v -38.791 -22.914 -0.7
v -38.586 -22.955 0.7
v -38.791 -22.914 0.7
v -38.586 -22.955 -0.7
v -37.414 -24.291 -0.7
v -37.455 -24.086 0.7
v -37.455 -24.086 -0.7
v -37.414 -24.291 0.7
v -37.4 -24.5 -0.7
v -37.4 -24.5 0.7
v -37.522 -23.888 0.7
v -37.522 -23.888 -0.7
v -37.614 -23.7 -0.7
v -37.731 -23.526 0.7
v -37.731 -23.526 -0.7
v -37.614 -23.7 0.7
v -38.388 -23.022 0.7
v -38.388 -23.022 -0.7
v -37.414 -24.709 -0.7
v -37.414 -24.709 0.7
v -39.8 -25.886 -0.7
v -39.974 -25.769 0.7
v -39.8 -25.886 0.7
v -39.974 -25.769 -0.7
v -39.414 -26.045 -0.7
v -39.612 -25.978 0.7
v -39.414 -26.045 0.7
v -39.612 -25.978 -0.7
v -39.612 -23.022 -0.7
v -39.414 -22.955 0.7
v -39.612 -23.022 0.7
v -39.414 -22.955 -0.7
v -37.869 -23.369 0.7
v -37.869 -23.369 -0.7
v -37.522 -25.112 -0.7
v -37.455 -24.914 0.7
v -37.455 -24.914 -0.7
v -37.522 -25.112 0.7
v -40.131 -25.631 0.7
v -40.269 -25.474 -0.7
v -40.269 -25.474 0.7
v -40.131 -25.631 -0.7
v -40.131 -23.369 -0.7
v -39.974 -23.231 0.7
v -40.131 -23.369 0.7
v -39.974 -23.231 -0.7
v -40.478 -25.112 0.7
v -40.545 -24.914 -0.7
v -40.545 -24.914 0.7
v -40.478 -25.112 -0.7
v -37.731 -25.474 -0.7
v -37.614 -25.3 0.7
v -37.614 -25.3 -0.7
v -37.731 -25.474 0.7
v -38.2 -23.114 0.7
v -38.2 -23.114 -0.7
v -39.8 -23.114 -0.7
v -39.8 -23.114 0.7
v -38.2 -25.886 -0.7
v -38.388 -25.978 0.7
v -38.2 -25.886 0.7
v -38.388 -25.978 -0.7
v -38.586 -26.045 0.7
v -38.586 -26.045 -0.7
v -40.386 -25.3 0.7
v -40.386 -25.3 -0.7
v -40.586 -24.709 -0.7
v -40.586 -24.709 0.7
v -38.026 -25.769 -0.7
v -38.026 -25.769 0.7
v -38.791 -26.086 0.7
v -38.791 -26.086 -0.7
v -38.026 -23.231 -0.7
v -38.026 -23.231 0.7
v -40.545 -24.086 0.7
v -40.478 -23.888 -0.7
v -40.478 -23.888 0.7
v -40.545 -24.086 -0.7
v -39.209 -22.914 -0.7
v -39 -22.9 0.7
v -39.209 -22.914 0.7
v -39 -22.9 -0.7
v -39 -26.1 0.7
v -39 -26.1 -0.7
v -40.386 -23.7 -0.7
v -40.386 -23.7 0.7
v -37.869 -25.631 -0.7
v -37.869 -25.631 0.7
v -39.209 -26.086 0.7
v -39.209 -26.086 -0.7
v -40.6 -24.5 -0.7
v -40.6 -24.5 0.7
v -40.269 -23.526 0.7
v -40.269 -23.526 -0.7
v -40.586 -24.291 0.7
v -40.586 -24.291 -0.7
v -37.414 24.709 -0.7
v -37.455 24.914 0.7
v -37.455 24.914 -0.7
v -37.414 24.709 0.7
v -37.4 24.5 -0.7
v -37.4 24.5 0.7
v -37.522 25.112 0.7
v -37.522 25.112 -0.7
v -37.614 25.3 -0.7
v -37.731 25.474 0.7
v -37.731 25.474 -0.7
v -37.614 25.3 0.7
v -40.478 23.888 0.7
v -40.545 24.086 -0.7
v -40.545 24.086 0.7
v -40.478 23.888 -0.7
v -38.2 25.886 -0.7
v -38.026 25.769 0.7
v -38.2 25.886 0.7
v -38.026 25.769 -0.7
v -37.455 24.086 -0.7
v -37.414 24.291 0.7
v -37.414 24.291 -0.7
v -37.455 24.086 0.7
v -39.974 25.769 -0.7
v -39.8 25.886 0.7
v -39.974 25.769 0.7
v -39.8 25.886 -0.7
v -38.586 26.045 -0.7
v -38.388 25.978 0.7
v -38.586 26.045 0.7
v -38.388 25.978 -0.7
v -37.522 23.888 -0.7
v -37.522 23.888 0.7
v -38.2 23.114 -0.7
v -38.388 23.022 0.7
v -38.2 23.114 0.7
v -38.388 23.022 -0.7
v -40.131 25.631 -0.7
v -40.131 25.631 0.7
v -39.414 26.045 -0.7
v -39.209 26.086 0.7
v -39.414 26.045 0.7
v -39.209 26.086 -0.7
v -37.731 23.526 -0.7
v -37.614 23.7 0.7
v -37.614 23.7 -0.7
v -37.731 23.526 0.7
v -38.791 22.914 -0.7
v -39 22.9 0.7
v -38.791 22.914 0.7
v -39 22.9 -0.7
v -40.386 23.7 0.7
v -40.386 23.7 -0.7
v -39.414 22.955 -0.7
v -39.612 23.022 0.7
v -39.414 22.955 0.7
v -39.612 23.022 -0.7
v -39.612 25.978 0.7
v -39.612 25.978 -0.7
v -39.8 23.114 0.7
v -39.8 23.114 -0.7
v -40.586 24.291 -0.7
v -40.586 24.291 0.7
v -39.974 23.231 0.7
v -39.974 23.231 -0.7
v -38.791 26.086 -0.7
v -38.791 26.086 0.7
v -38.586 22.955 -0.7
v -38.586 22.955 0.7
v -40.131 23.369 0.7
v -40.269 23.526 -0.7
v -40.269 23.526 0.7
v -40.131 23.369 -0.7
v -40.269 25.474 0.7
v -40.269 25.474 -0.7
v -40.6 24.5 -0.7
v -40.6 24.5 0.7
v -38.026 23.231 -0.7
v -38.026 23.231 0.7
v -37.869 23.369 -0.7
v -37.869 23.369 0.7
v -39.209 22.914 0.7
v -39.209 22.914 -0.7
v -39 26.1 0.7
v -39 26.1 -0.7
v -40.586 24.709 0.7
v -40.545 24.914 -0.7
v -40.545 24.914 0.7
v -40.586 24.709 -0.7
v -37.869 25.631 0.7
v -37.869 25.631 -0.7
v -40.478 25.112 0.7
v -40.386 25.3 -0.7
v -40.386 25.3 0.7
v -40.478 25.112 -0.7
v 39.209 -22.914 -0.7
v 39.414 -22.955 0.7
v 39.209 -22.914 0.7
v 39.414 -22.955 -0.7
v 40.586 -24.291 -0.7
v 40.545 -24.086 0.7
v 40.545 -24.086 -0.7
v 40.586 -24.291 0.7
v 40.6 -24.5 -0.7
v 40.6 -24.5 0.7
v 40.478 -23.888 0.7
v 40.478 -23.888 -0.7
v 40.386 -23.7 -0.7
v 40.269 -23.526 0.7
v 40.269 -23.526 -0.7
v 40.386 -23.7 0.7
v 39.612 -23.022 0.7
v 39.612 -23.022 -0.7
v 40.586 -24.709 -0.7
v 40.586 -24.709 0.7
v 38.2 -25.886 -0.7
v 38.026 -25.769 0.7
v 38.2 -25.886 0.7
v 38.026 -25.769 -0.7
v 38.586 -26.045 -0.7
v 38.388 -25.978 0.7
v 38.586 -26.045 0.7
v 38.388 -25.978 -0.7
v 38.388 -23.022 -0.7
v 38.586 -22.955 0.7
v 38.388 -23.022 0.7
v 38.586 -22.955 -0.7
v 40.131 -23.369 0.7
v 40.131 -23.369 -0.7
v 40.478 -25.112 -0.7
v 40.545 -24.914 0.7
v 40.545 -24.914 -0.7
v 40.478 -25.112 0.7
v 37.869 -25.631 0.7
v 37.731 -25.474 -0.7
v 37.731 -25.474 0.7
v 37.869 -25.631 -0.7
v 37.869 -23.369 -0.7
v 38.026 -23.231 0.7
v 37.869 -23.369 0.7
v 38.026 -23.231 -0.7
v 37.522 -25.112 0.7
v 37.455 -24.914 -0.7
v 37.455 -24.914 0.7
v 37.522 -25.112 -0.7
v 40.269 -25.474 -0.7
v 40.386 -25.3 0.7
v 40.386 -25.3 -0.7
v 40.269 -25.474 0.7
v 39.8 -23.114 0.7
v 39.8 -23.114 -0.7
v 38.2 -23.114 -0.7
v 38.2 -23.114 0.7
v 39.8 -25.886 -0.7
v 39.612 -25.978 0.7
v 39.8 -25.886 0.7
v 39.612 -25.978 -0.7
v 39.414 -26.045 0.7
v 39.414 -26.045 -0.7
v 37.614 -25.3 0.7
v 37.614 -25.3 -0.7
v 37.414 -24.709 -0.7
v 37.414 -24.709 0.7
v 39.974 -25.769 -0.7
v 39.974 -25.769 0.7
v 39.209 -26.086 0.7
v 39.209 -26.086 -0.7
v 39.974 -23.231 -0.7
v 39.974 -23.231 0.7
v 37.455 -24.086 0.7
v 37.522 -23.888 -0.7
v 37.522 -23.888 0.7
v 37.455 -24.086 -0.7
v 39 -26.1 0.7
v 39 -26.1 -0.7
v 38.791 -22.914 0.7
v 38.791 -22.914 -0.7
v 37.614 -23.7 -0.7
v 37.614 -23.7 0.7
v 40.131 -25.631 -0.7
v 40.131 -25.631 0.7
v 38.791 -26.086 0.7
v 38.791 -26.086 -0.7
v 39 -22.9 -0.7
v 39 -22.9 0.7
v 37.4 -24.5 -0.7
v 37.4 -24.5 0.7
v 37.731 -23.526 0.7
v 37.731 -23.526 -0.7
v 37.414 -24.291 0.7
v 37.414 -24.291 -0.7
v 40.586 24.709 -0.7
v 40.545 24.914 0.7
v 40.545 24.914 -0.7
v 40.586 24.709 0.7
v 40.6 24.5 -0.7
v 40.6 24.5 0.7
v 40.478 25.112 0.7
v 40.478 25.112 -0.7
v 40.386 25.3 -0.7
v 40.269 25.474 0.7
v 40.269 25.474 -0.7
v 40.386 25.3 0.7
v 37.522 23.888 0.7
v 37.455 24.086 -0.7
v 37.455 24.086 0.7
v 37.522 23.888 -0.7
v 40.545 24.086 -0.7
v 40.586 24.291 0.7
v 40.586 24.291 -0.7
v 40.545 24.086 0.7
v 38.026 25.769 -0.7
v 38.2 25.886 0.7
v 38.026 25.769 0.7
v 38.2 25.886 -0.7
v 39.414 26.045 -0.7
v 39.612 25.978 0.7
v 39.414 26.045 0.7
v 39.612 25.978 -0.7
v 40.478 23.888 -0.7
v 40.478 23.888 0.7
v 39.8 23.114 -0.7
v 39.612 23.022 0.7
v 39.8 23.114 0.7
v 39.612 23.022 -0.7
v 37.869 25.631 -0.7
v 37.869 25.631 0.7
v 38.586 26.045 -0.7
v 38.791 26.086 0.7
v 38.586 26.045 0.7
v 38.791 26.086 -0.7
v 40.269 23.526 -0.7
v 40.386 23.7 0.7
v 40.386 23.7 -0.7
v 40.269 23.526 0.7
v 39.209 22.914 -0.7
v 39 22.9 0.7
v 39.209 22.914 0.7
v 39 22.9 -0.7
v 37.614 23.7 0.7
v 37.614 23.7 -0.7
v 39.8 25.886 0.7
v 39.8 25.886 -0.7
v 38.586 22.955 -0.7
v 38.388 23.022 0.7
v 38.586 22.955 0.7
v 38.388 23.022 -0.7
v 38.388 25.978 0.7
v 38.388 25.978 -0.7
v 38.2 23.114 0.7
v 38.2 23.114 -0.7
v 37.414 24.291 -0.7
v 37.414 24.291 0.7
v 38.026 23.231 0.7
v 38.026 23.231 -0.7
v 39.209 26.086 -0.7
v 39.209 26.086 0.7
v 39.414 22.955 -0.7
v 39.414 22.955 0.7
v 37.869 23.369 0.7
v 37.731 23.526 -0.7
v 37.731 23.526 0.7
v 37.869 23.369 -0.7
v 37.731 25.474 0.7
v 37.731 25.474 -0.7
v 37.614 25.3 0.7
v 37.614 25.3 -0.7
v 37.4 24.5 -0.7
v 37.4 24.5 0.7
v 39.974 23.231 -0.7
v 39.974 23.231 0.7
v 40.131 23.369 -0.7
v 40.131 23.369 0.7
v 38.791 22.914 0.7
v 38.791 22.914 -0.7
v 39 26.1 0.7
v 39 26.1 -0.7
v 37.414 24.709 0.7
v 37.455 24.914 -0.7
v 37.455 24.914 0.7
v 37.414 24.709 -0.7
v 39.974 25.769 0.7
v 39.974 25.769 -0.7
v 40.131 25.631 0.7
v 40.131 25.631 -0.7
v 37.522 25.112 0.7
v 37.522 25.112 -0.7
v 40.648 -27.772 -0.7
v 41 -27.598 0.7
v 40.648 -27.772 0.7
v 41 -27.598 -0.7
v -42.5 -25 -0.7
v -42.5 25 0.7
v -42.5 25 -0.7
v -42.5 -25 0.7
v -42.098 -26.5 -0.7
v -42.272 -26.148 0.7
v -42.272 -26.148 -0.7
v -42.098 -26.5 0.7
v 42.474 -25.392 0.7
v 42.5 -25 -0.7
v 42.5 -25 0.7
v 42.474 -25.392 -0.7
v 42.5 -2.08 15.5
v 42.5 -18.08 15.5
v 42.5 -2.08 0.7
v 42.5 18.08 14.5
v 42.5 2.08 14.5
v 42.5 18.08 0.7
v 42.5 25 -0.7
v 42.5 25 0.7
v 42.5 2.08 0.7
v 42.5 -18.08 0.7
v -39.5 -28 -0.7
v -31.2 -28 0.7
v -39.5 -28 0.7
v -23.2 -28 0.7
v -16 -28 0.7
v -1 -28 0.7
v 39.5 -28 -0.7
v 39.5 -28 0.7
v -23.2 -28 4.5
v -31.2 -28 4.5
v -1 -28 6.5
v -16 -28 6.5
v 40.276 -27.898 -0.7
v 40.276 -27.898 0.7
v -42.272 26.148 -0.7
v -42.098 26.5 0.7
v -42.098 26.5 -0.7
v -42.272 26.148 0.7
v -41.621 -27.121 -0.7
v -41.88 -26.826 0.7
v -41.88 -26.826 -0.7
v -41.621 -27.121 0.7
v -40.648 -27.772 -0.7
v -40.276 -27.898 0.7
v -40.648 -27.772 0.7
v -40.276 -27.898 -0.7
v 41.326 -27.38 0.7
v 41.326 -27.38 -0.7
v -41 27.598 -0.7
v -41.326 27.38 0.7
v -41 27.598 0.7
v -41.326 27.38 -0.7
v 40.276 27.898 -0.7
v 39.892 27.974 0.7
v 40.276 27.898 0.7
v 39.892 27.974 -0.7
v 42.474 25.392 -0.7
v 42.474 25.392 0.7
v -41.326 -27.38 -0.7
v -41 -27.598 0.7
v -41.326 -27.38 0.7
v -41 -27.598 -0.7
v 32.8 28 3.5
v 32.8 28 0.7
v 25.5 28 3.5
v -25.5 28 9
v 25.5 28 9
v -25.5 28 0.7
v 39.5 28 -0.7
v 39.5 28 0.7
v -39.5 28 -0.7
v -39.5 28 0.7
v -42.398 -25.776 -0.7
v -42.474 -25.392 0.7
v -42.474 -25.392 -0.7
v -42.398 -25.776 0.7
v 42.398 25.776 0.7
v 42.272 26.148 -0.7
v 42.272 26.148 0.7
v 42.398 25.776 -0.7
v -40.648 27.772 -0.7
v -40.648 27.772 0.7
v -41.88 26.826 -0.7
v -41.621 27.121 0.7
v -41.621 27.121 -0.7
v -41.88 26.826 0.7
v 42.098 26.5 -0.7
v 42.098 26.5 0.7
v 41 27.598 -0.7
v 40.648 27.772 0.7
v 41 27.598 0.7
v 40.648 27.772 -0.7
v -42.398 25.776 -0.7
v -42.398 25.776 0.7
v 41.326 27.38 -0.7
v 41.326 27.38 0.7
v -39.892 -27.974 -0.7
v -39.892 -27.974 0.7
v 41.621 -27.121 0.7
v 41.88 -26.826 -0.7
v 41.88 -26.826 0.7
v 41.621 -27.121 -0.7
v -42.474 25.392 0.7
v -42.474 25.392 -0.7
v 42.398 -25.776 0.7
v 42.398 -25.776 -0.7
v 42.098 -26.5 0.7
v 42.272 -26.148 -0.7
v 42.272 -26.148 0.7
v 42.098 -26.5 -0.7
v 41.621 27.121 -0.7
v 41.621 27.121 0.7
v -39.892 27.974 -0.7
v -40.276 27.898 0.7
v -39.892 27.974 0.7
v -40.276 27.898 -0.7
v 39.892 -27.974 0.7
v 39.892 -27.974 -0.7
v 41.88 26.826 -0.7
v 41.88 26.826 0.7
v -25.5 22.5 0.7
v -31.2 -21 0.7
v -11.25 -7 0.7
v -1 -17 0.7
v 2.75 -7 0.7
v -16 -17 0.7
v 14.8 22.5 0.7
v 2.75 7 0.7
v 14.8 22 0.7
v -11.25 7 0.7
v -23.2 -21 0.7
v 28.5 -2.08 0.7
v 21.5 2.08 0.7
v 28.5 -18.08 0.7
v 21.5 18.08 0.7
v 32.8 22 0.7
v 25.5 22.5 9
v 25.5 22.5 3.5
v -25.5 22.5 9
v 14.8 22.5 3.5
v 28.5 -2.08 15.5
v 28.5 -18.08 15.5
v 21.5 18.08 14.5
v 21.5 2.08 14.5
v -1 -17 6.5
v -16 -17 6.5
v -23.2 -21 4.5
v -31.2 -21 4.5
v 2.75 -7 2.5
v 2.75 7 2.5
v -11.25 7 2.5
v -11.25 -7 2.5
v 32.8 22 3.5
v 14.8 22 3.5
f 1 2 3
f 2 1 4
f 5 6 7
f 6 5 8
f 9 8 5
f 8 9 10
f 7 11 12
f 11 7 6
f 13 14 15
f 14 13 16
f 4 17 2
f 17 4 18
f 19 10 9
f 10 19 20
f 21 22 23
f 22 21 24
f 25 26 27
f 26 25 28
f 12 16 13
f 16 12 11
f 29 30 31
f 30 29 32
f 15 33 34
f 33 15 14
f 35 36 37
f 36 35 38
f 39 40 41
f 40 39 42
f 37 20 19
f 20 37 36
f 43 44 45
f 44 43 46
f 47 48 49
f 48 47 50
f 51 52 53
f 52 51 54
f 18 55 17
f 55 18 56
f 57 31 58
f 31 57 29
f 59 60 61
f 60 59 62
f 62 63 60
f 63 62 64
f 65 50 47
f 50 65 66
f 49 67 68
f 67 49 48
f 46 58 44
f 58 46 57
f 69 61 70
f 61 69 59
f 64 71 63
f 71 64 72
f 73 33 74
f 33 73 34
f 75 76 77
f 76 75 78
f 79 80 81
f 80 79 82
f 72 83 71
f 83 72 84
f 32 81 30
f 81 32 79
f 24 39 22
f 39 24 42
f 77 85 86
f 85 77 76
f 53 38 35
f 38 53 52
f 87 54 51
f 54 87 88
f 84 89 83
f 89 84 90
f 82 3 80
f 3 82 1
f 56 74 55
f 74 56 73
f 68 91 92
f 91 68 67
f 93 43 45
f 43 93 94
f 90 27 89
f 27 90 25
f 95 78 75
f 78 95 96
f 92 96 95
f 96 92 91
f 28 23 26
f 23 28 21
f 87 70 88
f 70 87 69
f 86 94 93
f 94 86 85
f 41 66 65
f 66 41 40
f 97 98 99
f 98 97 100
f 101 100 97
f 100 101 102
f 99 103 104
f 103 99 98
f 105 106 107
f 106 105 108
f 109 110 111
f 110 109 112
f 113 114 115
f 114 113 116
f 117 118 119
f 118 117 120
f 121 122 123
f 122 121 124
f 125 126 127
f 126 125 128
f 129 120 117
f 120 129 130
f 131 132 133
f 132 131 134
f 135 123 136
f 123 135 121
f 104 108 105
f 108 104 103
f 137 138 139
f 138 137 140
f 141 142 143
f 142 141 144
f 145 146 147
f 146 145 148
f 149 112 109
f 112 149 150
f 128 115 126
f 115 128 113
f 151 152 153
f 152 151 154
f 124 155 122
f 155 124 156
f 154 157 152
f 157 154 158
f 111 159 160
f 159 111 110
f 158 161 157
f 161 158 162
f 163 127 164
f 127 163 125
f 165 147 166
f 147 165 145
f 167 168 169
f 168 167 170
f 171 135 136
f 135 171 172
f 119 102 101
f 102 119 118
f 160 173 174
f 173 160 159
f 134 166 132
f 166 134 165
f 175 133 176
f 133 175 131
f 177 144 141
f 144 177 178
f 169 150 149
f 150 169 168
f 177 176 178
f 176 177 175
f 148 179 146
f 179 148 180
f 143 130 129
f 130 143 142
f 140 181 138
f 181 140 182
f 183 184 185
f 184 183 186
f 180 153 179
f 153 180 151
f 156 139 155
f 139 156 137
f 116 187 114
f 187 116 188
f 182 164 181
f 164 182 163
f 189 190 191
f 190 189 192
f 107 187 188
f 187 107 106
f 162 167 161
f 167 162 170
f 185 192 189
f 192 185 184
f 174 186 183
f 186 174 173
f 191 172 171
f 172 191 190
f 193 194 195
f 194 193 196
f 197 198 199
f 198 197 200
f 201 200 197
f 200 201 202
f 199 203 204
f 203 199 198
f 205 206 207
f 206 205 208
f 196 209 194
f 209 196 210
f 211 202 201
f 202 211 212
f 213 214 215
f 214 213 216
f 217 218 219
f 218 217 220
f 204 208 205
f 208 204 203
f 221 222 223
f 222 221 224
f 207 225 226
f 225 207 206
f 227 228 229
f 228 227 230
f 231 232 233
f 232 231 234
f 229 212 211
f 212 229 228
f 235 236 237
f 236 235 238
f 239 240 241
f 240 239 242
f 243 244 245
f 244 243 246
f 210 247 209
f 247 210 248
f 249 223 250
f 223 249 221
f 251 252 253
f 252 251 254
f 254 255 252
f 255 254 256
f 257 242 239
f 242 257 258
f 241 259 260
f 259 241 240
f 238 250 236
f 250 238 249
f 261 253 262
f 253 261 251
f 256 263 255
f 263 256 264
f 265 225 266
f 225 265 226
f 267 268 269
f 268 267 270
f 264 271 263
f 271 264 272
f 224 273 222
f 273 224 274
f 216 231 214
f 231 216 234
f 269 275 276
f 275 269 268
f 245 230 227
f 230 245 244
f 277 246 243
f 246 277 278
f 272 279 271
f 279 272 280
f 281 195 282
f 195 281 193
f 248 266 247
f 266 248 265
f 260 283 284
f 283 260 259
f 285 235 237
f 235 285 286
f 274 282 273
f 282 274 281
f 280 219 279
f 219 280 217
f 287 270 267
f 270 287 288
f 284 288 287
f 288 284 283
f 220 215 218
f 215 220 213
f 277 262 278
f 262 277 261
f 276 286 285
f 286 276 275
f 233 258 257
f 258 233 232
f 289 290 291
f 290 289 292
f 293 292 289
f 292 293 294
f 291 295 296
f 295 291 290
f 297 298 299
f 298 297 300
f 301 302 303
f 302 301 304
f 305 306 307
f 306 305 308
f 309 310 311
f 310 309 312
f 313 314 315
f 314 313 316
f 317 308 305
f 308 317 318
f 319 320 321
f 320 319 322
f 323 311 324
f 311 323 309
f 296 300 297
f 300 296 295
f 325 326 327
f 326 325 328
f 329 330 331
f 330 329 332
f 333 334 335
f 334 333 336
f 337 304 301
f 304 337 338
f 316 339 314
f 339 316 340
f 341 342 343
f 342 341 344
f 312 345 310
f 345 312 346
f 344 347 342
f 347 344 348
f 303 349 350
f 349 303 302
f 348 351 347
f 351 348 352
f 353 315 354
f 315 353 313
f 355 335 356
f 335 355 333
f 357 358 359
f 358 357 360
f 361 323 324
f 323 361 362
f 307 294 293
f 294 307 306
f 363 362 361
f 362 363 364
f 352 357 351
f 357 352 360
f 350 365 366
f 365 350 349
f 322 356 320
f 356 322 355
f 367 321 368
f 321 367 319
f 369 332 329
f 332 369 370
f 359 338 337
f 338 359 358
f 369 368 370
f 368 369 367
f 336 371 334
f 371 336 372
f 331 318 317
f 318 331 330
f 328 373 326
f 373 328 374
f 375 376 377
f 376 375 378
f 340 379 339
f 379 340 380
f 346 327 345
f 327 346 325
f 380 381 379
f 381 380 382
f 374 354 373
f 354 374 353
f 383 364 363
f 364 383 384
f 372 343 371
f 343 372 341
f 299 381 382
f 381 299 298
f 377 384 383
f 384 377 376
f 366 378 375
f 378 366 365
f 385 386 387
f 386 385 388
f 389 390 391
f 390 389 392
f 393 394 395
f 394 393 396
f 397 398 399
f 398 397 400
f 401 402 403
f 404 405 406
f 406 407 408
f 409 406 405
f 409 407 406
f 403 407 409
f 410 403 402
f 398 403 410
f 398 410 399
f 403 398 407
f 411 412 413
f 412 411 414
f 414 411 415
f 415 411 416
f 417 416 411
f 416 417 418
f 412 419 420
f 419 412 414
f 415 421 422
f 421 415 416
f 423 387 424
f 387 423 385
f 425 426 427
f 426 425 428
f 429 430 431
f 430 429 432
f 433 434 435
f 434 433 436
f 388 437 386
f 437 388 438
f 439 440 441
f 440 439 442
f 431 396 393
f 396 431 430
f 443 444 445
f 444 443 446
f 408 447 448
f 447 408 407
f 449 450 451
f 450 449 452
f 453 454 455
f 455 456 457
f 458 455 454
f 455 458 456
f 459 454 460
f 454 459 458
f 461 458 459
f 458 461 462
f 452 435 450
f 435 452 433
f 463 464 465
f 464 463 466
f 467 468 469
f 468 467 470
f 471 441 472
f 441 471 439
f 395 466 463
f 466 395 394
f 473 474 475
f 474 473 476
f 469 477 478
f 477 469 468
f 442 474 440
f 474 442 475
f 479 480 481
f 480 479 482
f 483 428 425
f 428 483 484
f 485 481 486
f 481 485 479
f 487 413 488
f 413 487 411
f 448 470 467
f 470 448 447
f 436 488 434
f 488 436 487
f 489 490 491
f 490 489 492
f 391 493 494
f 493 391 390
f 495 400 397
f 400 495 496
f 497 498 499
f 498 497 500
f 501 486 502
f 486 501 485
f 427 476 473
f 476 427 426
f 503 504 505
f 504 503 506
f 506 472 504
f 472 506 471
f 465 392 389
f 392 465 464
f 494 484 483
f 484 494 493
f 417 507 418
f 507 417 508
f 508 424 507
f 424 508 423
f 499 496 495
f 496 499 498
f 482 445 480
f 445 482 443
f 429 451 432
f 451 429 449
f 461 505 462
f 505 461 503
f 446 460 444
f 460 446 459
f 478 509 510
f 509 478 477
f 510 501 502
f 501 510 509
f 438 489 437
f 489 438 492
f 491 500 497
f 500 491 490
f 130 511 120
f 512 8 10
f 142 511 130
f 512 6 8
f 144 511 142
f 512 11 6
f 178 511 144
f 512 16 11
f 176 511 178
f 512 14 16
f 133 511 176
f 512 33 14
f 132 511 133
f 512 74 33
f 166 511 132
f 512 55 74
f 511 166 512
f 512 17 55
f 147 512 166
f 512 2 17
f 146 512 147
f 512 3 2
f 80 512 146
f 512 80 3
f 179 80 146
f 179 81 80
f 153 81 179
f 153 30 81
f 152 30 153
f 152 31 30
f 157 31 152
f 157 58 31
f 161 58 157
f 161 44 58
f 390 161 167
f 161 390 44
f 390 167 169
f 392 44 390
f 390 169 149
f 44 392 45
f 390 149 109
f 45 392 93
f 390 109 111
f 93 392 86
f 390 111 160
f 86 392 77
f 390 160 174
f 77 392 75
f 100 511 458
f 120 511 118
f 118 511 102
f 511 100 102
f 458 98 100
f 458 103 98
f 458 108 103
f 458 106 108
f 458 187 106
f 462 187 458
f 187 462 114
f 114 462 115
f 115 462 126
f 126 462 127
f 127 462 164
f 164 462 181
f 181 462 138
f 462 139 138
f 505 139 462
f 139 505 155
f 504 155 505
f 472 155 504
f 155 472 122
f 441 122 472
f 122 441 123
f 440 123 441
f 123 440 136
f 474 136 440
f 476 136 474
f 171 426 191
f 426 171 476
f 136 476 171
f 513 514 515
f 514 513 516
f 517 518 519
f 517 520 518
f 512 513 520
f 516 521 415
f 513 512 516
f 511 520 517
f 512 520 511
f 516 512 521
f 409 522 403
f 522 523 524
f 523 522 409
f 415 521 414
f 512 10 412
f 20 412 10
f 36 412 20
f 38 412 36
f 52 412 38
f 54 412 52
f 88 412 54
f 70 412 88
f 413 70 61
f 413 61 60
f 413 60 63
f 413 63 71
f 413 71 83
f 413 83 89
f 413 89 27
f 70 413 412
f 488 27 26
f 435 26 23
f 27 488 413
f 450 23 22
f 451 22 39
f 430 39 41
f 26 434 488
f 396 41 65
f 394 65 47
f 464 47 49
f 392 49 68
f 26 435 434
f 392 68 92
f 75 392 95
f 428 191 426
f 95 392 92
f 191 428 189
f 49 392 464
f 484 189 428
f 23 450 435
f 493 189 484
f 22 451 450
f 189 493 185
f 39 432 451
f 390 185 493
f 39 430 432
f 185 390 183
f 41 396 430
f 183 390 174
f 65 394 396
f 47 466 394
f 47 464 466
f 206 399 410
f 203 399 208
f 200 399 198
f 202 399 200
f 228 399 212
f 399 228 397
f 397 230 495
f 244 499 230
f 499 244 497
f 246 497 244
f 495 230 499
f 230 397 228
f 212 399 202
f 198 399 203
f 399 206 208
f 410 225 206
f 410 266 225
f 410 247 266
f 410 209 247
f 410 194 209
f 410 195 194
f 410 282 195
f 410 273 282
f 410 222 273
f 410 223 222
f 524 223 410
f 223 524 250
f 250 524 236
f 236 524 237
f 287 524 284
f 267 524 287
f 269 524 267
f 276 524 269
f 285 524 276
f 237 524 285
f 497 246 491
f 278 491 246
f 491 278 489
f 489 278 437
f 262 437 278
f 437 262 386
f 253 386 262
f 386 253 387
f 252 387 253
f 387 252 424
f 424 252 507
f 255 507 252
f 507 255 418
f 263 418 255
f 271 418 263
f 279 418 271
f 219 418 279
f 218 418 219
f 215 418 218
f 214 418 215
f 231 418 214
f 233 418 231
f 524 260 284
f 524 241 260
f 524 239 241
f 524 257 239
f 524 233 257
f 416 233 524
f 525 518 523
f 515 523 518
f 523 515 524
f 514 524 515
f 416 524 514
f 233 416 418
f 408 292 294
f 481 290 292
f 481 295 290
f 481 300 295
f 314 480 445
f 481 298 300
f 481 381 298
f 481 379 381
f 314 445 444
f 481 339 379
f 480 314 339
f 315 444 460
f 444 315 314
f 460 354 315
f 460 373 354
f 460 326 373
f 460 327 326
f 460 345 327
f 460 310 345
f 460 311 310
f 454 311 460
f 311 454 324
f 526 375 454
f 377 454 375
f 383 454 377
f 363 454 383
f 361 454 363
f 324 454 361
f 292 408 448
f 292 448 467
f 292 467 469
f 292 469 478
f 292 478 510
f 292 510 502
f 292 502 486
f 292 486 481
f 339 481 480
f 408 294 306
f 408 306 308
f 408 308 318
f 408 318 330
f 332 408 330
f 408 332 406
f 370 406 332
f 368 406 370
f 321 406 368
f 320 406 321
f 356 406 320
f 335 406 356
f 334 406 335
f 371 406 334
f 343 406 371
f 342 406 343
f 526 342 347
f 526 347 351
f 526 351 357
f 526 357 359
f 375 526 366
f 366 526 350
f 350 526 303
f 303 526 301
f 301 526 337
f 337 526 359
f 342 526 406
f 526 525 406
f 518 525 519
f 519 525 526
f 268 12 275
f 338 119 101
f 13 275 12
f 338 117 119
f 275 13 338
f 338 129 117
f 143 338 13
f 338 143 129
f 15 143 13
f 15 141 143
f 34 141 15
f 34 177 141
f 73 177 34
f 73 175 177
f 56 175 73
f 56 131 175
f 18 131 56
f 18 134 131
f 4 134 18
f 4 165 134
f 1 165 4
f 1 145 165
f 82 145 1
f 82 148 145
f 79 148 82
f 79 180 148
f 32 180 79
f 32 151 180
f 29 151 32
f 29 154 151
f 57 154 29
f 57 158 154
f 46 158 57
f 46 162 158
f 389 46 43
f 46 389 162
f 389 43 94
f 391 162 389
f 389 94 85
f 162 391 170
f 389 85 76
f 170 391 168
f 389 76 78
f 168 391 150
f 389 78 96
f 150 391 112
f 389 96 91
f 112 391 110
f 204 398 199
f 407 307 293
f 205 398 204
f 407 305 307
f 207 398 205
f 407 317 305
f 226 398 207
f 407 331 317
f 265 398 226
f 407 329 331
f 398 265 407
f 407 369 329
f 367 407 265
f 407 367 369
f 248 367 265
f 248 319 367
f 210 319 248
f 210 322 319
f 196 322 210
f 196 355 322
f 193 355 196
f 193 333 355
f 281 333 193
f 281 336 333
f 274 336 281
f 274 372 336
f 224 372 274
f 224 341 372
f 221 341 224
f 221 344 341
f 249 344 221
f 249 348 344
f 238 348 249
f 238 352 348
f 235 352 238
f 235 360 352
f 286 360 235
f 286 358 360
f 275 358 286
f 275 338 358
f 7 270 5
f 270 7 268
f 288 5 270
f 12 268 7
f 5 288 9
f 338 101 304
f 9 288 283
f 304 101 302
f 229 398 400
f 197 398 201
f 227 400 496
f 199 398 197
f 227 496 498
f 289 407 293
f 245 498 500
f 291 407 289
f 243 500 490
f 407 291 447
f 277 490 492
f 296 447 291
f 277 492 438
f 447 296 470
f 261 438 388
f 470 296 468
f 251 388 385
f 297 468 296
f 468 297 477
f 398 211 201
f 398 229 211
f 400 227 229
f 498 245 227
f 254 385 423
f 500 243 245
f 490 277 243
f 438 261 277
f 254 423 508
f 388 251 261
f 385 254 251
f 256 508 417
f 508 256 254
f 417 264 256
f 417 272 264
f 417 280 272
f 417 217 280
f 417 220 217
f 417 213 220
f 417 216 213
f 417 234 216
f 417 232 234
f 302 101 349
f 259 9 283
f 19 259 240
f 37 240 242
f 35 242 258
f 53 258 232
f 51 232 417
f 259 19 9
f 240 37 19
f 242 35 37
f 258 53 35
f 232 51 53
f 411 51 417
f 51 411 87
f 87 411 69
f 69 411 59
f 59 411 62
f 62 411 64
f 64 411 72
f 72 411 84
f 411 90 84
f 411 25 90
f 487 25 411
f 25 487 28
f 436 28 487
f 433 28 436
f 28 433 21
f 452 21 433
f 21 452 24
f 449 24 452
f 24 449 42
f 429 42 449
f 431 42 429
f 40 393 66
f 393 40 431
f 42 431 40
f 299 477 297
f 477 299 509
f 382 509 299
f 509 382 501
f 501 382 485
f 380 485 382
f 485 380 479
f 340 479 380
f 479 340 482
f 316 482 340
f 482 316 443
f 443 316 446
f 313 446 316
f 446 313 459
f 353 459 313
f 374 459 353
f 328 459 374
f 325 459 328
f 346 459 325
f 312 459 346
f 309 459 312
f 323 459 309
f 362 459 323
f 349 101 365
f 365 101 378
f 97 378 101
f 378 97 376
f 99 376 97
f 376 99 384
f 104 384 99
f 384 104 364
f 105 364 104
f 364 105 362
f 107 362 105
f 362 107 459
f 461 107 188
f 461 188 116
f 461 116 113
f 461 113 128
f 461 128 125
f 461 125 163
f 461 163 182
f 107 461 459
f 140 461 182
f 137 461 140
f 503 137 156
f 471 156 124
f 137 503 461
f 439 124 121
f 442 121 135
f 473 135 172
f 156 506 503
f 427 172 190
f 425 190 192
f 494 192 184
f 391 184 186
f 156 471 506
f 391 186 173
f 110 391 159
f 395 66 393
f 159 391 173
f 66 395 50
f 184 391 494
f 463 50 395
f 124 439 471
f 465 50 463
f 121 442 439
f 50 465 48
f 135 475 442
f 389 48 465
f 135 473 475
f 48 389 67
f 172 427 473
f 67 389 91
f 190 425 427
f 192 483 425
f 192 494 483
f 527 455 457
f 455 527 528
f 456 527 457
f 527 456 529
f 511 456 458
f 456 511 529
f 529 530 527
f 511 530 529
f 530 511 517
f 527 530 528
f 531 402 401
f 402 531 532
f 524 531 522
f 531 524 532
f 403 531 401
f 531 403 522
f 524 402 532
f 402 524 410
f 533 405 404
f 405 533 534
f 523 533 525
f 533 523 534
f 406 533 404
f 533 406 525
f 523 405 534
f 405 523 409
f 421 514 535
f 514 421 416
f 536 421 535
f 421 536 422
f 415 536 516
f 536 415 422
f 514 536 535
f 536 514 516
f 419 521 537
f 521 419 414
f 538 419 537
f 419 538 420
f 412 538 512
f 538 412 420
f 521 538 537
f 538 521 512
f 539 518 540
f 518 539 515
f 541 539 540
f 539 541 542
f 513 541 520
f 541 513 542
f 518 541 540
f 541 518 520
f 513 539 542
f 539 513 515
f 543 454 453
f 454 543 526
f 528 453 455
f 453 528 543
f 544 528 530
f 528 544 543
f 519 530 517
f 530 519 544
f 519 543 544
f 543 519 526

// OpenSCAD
$fn = 48;

// Target PCB dimensions (mm)
pcb_length = 85.0;
pcb_width  = 56.0;
pcb_thickness = 1.4;

// Small overlap to guarantee watertight unions
overlap = 0.2;

// ---------- Helpers ----------
module rounded_rect_prism(l, w, h, r, center=true) {
    // Rounded rectangle via hull of 4 cylinders
    translate(center ? [0,0,0] : [l/2, w/2, h/2])
    hull() {
        for (sx = [-1, 1], sy = [-1, 1])
            translate([sx*(l/2 - r), sy*(w/2 - r), -h/2])
                cylinder(h=h, r=r);
    }
}

module place_on_top(z0, h) {
    // Places a centered object of height h so its bottom slightly overlaps the PCB top
    translate([0, 0, z0 + h/2 - overlap]) children();
}

// ---------- SBC Model ----------
module sbc_complete_model() {

    // PCB with mounting holes (difference keeps it one solid with holes)
    pcb_corner_r = 3.0;
    hole_r = 1.6; // ~3.2mm dia
    hole_edge_x = 3.5;
    hole_edge_y = 3.5;

    z_pcb_top = pcb_thickness/2;

    union() {
        // PCB body with holes
        color([0.0, 0.4, 0.2])
        difference() {
            rounded_rect_prism(pcb_length, pcb_width, pcb_thickness, pcb_corner_r, center=true);

            for (sx = [-1, 1], sy = [-1, 1]) {
                translate([sx*(pcb_length/2 - hole_edge_x), sy*(pcb_width/2 - hole_edge_y), 0])
                    cylinder(h=pcb_thickness + 2*overlap, r=hole_r, center=true);
            }
        }

        // Components/connectors (all connected by slight overlap into PCB)

        // 40-pin header (approx) along one long edge
        hdr_l = 51.0;
        hdr_w = 5.5;
        hdr_h = 8.5;
        hdr_y = pcb_width/2 - hdr_w/2;
        place_on_top(z_pcb_top, hdr_h)
            translate([0, hdr_y, 0])
                color([0.1, 0.1, 0.1])
                    cube([hdr_l, hdr_w, hdr_h], center=true);

        // USB-A stack (2 ports) on one short edge
        usb_w = 16.0;   // along Y
        usb_d = 14.0;   // along X (sticks out)
        usb_h = 15.0;
        usb_x = pcb_length/2 - usb_d/2; // centered so it reaches the edge
        usb_y = -pcb_width*0.18;
        place_on_top(z_pcb_top, usb_h)
            translate([usb_x, usb_y, 0])
                color([0.75, 0.75, 0.75])
                    cube([usb_d, usb_w, usb_h], center=true);

        // Ethernet jack next to USB
        eth_w = 16.0;
        eth_d = 21.0;
        eth_h = 14.0;
        eth_x = pcb_length/2 - eth_d/2;
        eth_y = pcb_width*0.18;
        place_on_top(z_pcb_top, eth_h)
            translate([eth_x, eth_y, 0])
                color([0.7, 0.7, 0.7])
                    cube([eth_d, eth_w, eth_h], center=true);

        // HDMI connector on opposite long edge
        hdmi_l = 15.0;  // along X
        hdmi_w = 11.0;  // along Y (sticks out)
        hdmi_h = 6.0;
        hdmi_y = -pcb_width/2 + hdmi_w/2;
        hdmi_x = -pcb_length*0.10;
        place_on_top(z_pcb_top, hdmi_h)
            translate([hdmi_x, hdmi_y, 0])
                color([0.6, 0.6, 0.6])
                    cube([hdmi_l, hdmi_w, hdmi_h], center=true);

        // Micro-USB / USB-C power connector near HDMI
        pwr_l = 8.0;
        pwr_w = 7.0;
        pwr_h = 4.0;
        pwr_y = -pcb_width/2 + pwr_w/2;
        pwr_x = -pcb_length*0.32;
        place_on_top(z_pcb_top, pwr_h)
            translate([pwr_x, pwr_y, 0])
                color([0.65, 0.65, 0.65])
                    cube([pwr_l, pwr_w, pwr_h], center=true);

        // SoC package (square IC) near center
        soc_s = 14.0;
        soc_h = 2.0;
        soc_x = -pcb_length*0.05;
        soc_y = 0;
        place_on_top(z_pcb_top, soc_h)
            translate([soc_x, soc_y, 0])
                color([0.15, 0.15, 0.15])
                    cube([soc_s, soc_s, soc_h], center=true);

        // Camera/Display FFC connector (small) on top edge
        ffc_l = 18.0;
        ffc_w = 6.0;
        ffc_h = 3.0;
        ffc_y = pcb_width/2 - ffc_w/2;
        ffc_x = pcb_length*0.28;
        place_on_top(z_pcb_top, ffc_h)
            translate([ffc_x, ffc_y, 0])
                color([0.85, 0.85, 0.85])
                    cube([ffc_l, ffc_w, ffc_h], center=true);
    }
}

// Render
sbc_complete_model();
